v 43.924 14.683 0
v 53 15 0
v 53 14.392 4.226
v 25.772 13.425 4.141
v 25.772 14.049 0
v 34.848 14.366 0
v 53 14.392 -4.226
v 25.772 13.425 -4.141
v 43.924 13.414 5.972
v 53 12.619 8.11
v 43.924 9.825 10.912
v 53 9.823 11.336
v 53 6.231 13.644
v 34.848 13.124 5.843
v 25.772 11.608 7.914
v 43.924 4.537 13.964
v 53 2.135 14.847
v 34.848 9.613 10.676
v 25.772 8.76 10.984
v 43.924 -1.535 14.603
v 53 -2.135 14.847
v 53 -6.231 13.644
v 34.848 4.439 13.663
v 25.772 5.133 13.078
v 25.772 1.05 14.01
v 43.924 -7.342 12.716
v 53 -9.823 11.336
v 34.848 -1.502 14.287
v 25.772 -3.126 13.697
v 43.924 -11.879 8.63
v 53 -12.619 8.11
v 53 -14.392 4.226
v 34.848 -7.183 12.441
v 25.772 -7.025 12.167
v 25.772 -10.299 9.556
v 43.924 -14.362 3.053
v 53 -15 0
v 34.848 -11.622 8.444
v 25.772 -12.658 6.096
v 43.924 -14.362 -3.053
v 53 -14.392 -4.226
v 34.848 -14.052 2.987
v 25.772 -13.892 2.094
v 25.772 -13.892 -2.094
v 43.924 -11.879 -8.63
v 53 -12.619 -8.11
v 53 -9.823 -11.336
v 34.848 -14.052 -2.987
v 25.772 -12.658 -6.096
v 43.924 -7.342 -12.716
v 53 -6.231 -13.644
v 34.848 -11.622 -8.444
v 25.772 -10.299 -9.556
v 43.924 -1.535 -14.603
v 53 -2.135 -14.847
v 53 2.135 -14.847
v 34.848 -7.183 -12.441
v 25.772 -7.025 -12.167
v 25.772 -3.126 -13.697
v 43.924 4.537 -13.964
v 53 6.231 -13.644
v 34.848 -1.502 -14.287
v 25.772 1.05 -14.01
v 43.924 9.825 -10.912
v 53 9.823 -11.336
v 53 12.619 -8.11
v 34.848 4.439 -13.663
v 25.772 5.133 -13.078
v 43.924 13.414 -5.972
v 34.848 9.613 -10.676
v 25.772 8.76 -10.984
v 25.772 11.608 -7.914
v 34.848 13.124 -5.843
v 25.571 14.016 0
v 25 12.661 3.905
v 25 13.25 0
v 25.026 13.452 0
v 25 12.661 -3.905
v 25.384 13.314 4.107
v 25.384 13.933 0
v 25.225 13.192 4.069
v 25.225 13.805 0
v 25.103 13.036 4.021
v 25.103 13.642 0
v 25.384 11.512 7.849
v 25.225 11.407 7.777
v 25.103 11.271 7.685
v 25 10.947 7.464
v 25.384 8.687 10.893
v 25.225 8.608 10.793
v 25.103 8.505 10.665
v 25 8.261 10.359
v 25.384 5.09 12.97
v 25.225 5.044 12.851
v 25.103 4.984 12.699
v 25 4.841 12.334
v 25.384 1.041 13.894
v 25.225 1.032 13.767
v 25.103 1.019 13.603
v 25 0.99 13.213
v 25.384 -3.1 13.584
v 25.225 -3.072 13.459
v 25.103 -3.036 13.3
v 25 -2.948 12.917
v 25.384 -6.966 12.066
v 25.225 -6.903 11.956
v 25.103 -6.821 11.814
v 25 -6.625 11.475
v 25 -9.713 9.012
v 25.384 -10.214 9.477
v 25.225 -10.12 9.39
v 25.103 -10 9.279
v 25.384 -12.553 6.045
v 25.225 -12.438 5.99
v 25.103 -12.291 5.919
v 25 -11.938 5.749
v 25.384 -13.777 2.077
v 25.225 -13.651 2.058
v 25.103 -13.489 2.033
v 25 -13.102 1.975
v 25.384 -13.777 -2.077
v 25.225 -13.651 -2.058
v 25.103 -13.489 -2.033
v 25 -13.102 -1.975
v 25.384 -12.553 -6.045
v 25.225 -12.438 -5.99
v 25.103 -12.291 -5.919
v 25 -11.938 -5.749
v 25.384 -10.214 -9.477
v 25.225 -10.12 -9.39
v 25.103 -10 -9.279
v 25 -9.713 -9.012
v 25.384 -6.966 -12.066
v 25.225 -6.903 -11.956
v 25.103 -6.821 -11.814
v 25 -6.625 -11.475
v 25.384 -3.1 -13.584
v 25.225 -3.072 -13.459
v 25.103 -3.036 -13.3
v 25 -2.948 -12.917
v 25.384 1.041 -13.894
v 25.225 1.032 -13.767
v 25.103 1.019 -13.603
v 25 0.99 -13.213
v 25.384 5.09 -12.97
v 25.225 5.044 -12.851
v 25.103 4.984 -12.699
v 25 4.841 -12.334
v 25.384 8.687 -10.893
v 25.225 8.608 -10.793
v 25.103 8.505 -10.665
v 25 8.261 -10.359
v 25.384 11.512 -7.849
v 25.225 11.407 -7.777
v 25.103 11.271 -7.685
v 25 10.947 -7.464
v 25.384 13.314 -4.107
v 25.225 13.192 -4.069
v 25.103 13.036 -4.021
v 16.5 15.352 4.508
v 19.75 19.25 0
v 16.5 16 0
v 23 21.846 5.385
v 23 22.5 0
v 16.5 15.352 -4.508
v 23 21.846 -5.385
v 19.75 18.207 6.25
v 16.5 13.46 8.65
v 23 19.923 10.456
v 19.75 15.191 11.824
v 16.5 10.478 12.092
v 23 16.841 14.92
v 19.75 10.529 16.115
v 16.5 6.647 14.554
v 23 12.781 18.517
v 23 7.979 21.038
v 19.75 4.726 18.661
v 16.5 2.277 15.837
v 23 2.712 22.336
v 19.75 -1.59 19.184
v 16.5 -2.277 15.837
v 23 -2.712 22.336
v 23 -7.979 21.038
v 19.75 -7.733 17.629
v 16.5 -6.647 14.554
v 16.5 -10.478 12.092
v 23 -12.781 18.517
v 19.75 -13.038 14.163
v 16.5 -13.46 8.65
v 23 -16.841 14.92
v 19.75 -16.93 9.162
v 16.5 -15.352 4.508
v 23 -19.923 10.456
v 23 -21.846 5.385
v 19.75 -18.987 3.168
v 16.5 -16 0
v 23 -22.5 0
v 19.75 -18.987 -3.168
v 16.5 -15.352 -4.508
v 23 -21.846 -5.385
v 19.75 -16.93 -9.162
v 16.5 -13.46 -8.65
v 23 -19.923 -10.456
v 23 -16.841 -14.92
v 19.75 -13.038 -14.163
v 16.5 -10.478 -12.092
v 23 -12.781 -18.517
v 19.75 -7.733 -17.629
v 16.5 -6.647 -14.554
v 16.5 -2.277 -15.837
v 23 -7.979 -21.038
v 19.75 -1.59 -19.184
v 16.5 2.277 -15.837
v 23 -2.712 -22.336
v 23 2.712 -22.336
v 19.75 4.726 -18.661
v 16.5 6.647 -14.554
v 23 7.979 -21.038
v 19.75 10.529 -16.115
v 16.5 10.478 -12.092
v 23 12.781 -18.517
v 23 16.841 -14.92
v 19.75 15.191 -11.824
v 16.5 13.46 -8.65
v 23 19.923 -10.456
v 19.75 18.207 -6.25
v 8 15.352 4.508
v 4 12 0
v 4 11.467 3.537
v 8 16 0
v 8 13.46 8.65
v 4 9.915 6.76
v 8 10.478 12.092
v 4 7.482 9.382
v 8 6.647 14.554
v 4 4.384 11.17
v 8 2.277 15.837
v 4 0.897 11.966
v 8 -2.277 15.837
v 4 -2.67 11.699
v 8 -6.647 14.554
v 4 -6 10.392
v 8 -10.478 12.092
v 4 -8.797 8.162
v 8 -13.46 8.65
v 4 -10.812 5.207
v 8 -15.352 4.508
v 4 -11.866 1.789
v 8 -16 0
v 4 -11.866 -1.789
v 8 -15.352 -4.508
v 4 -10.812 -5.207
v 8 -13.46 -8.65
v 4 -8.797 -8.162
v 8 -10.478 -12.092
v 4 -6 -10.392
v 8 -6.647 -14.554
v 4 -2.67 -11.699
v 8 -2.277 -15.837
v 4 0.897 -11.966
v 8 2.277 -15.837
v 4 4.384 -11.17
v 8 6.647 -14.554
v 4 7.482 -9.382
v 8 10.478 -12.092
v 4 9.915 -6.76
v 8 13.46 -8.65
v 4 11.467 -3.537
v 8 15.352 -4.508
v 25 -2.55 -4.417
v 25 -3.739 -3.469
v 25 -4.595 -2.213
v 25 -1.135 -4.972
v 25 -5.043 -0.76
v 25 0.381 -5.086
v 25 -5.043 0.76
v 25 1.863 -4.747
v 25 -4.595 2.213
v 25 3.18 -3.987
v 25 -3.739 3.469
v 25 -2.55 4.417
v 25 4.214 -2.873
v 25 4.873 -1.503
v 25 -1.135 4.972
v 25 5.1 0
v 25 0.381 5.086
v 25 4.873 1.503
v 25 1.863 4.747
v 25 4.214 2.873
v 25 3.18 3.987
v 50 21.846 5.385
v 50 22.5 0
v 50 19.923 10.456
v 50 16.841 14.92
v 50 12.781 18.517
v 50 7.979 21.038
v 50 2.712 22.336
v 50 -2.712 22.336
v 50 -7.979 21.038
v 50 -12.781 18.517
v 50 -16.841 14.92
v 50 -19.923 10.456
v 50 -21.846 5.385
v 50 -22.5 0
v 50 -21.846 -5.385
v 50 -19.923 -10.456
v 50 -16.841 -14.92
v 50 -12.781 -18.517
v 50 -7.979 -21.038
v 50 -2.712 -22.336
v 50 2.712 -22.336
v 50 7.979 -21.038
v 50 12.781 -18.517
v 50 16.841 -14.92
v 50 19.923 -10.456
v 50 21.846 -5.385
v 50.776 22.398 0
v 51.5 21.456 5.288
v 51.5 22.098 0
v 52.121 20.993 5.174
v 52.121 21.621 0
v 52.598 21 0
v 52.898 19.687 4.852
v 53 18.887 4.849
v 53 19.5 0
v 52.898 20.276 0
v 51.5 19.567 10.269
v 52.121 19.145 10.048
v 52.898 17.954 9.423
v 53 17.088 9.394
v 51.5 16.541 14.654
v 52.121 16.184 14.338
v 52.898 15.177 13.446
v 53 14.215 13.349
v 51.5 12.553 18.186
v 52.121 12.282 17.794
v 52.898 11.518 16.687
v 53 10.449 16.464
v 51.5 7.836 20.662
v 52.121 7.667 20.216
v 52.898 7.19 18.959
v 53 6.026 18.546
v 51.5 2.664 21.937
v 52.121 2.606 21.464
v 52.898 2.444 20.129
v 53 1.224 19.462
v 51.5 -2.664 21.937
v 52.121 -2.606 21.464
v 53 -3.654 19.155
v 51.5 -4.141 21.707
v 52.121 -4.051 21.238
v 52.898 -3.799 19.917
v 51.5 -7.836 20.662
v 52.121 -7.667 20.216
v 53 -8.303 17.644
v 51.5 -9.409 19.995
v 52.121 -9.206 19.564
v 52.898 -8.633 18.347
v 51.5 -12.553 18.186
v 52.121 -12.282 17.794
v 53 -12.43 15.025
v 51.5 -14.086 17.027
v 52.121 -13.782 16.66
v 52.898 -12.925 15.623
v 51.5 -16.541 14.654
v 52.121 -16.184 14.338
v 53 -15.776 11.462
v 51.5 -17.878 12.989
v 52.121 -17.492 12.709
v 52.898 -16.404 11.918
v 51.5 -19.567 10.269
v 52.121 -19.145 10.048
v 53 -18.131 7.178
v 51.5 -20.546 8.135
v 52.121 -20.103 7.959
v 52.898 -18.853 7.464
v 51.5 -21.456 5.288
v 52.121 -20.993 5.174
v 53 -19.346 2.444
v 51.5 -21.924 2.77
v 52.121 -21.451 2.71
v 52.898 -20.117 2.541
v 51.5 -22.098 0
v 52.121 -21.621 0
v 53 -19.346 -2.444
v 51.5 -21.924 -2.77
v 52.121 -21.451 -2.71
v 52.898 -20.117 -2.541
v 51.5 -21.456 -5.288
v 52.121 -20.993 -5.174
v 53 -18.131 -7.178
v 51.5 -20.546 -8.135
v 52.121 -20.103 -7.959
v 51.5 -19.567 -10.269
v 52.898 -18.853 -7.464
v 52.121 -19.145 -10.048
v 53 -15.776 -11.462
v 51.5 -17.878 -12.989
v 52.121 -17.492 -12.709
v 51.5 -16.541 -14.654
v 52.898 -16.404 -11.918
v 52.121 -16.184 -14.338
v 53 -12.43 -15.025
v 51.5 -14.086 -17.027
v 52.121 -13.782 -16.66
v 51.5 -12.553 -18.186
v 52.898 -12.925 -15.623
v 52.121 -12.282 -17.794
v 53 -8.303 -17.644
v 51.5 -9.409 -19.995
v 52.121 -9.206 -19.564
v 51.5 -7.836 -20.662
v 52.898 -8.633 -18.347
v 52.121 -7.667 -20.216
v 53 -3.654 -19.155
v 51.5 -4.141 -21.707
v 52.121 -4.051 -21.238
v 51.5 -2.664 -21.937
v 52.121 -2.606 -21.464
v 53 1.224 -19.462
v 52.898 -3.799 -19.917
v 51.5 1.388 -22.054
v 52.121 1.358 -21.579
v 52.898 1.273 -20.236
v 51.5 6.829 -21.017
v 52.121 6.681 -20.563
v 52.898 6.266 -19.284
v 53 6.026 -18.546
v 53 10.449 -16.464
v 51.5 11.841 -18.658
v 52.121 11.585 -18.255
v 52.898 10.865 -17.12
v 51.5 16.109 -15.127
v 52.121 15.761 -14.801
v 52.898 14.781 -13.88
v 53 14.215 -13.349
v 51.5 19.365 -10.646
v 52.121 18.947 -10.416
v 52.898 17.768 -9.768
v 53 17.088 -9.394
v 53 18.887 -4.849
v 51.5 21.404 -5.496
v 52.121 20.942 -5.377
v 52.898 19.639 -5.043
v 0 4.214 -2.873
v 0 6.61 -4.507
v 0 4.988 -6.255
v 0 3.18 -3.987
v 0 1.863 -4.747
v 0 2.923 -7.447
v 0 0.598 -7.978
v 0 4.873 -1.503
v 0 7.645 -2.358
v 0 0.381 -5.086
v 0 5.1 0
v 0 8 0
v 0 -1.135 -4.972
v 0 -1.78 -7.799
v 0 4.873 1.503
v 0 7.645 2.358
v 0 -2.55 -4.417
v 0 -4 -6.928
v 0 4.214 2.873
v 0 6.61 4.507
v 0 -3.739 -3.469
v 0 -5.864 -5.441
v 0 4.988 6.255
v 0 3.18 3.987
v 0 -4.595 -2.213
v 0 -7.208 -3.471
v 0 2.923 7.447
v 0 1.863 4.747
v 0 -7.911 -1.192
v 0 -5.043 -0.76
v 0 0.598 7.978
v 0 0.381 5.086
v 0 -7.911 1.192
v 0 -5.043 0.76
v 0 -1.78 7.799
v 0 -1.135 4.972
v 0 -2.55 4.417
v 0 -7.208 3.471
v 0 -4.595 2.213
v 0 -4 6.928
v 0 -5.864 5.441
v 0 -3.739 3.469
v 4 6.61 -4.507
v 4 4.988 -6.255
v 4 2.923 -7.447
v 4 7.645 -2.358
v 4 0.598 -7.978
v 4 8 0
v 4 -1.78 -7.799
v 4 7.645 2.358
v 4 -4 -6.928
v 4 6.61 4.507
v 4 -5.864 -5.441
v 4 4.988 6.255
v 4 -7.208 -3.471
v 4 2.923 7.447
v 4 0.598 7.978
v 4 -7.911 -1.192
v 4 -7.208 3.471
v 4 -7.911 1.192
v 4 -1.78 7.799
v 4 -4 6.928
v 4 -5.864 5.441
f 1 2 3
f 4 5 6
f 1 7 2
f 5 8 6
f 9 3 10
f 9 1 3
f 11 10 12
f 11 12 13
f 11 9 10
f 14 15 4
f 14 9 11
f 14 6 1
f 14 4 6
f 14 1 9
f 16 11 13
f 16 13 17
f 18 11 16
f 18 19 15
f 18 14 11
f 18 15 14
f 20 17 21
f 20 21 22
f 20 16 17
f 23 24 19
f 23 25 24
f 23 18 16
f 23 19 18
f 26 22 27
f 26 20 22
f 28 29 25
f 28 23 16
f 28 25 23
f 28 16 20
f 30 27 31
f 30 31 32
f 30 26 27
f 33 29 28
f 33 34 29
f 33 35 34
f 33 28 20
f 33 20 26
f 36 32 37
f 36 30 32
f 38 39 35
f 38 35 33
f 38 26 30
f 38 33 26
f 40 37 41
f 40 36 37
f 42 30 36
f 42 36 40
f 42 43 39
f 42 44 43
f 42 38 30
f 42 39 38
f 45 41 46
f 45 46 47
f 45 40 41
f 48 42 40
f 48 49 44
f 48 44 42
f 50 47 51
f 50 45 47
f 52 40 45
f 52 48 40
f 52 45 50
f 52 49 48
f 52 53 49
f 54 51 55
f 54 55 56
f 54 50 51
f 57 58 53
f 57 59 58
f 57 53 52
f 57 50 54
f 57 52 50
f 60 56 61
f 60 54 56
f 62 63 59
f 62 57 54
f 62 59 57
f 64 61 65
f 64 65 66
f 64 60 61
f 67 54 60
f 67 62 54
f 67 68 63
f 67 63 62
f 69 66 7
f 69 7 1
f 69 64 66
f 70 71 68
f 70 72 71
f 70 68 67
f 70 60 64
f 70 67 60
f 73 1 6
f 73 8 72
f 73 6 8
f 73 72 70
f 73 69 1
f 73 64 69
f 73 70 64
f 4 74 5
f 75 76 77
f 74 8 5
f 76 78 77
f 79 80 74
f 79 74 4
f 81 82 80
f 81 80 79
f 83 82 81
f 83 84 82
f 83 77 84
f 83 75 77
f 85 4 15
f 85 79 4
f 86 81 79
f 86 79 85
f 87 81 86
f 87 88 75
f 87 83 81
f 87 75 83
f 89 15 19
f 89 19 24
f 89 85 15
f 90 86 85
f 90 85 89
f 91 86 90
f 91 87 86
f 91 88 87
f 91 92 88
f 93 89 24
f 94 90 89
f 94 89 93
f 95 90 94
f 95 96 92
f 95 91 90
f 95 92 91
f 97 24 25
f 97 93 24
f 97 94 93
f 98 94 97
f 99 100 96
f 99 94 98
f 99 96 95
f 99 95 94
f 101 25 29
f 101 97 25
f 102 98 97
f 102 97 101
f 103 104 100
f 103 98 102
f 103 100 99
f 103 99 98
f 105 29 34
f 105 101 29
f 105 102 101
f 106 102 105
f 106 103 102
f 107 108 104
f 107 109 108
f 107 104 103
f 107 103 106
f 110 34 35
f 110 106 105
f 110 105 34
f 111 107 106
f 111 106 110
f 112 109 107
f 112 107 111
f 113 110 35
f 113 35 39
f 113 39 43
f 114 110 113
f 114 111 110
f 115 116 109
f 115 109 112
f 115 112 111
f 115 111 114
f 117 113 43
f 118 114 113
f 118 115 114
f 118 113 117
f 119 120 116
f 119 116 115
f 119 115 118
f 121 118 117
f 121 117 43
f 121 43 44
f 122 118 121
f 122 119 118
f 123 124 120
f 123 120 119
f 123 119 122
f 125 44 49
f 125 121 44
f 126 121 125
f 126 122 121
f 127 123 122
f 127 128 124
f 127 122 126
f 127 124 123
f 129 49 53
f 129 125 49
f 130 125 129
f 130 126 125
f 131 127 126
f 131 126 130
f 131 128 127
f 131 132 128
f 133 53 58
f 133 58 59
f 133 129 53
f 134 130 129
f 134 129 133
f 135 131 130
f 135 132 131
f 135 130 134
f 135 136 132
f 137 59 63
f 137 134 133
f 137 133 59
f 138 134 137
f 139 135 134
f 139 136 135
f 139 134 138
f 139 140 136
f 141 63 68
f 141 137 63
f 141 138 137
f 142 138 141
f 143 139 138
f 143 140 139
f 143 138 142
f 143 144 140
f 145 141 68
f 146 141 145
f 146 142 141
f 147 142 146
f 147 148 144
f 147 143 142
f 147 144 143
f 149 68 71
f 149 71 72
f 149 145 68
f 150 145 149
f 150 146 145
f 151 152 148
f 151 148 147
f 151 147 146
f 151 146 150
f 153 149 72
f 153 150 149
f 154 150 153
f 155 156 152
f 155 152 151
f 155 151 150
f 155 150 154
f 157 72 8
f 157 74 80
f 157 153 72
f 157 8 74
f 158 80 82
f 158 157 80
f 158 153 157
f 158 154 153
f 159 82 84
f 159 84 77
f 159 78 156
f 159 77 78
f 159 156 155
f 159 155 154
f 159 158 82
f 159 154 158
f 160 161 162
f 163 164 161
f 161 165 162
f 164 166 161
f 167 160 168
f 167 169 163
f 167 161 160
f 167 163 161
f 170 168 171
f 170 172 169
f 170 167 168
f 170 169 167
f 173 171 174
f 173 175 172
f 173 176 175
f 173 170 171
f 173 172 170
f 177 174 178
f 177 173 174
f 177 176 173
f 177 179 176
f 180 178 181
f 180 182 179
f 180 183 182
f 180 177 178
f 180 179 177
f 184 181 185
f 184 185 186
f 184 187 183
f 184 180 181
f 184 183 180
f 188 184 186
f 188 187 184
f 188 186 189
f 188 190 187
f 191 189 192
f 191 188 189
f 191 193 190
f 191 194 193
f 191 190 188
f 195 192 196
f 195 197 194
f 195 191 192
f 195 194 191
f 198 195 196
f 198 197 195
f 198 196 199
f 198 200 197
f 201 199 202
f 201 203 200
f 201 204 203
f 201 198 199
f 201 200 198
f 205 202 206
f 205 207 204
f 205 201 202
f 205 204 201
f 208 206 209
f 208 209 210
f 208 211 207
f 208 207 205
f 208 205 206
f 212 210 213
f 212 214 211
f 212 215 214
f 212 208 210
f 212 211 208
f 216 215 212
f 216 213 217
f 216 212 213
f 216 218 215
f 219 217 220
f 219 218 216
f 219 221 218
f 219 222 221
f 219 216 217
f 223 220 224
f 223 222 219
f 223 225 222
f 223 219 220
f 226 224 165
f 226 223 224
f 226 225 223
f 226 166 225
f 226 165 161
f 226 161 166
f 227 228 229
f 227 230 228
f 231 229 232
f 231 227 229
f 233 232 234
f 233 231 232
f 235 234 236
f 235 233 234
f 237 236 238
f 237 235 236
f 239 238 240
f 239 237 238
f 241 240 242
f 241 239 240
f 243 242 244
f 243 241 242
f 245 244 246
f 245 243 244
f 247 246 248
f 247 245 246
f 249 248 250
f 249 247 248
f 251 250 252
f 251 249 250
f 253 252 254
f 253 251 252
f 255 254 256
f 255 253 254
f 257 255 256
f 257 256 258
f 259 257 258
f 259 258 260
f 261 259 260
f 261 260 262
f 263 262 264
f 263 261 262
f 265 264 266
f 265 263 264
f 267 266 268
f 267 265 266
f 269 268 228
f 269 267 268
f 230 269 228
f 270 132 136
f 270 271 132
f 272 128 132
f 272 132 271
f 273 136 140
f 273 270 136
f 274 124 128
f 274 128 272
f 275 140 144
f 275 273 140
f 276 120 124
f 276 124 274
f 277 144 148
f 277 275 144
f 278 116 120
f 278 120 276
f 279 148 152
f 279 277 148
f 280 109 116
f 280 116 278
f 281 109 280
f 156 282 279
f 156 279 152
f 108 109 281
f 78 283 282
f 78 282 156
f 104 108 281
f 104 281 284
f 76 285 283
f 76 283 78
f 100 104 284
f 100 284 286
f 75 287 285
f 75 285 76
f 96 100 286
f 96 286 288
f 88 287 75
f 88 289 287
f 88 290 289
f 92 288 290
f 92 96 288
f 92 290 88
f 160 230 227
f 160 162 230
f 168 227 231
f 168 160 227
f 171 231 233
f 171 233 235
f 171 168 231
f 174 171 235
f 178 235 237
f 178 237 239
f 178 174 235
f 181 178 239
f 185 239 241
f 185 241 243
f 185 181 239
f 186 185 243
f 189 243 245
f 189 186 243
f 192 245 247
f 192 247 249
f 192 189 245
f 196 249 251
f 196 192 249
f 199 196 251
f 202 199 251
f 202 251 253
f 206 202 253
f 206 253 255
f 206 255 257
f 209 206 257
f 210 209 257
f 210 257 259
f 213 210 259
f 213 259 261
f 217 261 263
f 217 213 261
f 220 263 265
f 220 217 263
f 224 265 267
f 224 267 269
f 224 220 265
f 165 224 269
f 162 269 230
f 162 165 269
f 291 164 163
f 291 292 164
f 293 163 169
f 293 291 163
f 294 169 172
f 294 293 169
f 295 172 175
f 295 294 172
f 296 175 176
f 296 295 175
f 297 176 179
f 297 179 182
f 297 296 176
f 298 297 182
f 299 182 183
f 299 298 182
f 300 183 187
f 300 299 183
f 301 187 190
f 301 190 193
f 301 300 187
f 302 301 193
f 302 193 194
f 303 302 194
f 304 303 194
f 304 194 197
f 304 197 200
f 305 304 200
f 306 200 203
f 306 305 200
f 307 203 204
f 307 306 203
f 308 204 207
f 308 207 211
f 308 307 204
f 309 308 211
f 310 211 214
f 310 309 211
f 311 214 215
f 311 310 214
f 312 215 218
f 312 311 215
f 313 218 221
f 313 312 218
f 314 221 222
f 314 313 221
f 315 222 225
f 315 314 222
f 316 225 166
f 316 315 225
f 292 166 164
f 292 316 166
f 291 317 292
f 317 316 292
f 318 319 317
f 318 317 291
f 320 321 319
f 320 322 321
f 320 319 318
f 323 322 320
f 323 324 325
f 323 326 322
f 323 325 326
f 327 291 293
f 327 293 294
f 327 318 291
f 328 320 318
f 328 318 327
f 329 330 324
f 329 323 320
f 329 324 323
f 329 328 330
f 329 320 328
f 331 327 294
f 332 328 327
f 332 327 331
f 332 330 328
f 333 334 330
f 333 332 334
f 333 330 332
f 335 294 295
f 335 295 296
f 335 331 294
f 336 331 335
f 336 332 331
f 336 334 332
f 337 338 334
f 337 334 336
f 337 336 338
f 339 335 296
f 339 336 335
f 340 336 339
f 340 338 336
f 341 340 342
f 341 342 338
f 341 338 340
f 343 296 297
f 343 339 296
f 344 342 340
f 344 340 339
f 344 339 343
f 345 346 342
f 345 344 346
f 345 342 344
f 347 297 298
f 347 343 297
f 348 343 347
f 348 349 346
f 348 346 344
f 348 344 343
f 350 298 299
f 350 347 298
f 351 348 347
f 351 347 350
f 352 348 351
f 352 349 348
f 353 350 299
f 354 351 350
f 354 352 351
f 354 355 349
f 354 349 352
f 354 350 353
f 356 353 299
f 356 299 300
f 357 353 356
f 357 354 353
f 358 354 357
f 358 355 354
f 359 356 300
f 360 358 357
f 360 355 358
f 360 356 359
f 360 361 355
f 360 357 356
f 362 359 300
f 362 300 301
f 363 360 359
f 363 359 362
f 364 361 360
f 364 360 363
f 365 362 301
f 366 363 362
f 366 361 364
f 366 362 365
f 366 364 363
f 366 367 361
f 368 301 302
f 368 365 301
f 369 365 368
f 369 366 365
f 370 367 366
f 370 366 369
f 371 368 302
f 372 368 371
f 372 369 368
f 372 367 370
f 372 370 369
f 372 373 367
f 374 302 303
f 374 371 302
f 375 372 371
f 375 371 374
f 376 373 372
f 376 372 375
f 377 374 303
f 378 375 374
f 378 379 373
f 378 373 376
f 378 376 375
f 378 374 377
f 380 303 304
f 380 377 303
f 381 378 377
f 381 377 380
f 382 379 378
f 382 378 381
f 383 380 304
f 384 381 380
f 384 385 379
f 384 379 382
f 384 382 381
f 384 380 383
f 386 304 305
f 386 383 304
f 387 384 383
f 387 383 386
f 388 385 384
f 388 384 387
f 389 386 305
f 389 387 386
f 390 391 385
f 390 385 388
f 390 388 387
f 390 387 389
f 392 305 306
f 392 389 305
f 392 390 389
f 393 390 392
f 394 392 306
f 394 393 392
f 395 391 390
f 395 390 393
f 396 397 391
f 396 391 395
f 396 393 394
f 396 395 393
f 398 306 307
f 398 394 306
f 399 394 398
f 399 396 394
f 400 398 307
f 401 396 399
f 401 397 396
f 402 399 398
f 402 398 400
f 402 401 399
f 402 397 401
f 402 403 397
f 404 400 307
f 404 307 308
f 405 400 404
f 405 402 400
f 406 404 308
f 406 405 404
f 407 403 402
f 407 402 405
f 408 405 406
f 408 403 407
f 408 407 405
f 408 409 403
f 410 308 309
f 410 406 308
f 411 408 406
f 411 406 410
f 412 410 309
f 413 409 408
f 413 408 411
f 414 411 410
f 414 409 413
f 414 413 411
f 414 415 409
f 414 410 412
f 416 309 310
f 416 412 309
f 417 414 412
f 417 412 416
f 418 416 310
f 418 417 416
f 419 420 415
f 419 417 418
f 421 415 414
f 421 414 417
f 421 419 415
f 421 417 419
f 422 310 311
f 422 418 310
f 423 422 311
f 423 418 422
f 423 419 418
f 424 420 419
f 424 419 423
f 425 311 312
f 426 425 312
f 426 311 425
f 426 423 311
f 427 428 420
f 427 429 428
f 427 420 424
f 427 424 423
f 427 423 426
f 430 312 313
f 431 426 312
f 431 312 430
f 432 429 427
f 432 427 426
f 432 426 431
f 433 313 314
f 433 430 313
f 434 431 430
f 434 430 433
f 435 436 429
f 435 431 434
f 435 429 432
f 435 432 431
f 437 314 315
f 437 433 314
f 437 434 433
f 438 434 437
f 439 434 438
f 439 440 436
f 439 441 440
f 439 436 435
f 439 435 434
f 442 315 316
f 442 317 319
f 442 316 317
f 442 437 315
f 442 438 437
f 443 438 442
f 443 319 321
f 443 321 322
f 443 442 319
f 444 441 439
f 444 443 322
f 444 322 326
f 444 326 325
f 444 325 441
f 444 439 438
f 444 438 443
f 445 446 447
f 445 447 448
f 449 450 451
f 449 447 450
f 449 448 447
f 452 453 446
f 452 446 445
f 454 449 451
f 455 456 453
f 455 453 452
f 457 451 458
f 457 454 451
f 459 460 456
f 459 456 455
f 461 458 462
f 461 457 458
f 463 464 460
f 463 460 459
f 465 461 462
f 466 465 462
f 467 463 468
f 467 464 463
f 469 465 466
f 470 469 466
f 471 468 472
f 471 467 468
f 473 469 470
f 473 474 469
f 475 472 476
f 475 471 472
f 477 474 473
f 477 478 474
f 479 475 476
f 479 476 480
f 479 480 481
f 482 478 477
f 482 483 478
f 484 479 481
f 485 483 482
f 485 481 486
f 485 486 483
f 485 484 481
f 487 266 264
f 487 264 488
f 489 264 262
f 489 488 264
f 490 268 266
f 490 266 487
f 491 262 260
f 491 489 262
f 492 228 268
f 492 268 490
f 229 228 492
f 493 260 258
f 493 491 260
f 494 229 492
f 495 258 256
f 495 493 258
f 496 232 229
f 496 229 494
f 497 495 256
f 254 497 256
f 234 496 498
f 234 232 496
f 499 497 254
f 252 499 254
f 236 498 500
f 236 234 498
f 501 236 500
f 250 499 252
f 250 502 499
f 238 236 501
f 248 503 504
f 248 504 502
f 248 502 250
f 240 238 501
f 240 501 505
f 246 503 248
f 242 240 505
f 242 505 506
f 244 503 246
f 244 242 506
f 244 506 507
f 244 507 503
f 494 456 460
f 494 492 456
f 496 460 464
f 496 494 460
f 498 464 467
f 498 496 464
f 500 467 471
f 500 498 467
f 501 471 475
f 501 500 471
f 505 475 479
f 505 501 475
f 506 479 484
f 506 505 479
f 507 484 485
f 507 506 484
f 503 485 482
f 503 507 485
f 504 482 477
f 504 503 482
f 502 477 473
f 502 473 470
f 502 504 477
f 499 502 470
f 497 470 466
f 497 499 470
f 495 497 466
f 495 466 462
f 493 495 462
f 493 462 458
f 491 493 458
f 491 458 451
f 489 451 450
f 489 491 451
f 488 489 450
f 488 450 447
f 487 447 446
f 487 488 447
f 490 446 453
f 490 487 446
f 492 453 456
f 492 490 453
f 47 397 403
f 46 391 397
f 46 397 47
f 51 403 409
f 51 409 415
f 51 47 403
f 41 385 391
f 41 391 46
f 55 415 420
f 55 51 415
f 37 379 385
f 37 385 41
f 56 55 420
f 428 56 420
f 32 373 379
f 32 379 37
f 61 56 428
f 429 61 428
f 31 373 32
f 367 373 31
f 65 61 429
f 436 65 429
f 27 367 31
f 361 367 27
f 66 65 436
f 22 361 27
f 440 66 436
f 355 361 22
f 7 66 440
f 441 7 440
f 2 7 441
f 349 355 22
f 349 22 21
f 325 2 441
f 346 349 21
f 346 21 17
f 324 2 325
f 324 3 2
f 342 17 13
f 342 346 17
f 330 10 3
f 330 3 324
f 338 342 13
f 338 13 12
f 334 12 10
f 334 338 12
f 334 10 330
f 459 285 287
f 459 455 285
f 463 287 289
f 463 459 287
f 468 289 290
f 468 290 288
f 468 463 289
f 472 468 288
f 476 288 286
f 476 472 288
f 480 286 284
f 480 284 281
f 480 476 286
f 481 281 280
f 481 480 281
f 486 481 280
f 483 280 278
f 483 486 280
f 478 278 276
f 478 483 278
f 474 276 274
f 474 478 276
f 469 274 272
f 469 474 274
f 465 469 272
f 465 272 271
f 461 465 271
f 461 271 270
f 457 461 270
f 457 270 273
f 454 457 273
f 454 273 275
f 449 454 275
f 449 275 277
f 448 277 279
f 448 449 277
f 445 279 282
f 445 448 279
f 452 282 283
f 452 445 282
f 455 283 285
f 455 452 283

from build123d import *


with BuildPart() as part:
    # Sketch1 → Revolve1 (revolve)
    with BuildSketch(Plane.XY):
        with BuildLine():
            Line((0, 8), (4, 8))
            Line((4, 8), (4, 12))
            Line((4, 12), (8, 16))
            Line((8, 16), (16.5, 16))
            Line((16.5, 16), (23, 22.5))
            Line((23, 22.5), (50, 22.5))
            ThreePointArc((50, 22.5), (52.121320344, 21.621320344), (53, 19.5))
            Line((53, 19.5), (53, 15))
            Line((53, 15), (25.772080403, 14.049180096))
            ThreePointArc((25.772080403, 14.049180096), (25.22452816, 13.805394131), (25, 13.249667434))
            Line((25, 13.249667434), (25, 5.1))
            Line((25, 5.1), (0, 5.1))
            Line((0, 5.1), (0, 8))
        make_face()
    revolve(axis=Axis((0, 0, 0), (1, 0, 0)))


solid = part.part
